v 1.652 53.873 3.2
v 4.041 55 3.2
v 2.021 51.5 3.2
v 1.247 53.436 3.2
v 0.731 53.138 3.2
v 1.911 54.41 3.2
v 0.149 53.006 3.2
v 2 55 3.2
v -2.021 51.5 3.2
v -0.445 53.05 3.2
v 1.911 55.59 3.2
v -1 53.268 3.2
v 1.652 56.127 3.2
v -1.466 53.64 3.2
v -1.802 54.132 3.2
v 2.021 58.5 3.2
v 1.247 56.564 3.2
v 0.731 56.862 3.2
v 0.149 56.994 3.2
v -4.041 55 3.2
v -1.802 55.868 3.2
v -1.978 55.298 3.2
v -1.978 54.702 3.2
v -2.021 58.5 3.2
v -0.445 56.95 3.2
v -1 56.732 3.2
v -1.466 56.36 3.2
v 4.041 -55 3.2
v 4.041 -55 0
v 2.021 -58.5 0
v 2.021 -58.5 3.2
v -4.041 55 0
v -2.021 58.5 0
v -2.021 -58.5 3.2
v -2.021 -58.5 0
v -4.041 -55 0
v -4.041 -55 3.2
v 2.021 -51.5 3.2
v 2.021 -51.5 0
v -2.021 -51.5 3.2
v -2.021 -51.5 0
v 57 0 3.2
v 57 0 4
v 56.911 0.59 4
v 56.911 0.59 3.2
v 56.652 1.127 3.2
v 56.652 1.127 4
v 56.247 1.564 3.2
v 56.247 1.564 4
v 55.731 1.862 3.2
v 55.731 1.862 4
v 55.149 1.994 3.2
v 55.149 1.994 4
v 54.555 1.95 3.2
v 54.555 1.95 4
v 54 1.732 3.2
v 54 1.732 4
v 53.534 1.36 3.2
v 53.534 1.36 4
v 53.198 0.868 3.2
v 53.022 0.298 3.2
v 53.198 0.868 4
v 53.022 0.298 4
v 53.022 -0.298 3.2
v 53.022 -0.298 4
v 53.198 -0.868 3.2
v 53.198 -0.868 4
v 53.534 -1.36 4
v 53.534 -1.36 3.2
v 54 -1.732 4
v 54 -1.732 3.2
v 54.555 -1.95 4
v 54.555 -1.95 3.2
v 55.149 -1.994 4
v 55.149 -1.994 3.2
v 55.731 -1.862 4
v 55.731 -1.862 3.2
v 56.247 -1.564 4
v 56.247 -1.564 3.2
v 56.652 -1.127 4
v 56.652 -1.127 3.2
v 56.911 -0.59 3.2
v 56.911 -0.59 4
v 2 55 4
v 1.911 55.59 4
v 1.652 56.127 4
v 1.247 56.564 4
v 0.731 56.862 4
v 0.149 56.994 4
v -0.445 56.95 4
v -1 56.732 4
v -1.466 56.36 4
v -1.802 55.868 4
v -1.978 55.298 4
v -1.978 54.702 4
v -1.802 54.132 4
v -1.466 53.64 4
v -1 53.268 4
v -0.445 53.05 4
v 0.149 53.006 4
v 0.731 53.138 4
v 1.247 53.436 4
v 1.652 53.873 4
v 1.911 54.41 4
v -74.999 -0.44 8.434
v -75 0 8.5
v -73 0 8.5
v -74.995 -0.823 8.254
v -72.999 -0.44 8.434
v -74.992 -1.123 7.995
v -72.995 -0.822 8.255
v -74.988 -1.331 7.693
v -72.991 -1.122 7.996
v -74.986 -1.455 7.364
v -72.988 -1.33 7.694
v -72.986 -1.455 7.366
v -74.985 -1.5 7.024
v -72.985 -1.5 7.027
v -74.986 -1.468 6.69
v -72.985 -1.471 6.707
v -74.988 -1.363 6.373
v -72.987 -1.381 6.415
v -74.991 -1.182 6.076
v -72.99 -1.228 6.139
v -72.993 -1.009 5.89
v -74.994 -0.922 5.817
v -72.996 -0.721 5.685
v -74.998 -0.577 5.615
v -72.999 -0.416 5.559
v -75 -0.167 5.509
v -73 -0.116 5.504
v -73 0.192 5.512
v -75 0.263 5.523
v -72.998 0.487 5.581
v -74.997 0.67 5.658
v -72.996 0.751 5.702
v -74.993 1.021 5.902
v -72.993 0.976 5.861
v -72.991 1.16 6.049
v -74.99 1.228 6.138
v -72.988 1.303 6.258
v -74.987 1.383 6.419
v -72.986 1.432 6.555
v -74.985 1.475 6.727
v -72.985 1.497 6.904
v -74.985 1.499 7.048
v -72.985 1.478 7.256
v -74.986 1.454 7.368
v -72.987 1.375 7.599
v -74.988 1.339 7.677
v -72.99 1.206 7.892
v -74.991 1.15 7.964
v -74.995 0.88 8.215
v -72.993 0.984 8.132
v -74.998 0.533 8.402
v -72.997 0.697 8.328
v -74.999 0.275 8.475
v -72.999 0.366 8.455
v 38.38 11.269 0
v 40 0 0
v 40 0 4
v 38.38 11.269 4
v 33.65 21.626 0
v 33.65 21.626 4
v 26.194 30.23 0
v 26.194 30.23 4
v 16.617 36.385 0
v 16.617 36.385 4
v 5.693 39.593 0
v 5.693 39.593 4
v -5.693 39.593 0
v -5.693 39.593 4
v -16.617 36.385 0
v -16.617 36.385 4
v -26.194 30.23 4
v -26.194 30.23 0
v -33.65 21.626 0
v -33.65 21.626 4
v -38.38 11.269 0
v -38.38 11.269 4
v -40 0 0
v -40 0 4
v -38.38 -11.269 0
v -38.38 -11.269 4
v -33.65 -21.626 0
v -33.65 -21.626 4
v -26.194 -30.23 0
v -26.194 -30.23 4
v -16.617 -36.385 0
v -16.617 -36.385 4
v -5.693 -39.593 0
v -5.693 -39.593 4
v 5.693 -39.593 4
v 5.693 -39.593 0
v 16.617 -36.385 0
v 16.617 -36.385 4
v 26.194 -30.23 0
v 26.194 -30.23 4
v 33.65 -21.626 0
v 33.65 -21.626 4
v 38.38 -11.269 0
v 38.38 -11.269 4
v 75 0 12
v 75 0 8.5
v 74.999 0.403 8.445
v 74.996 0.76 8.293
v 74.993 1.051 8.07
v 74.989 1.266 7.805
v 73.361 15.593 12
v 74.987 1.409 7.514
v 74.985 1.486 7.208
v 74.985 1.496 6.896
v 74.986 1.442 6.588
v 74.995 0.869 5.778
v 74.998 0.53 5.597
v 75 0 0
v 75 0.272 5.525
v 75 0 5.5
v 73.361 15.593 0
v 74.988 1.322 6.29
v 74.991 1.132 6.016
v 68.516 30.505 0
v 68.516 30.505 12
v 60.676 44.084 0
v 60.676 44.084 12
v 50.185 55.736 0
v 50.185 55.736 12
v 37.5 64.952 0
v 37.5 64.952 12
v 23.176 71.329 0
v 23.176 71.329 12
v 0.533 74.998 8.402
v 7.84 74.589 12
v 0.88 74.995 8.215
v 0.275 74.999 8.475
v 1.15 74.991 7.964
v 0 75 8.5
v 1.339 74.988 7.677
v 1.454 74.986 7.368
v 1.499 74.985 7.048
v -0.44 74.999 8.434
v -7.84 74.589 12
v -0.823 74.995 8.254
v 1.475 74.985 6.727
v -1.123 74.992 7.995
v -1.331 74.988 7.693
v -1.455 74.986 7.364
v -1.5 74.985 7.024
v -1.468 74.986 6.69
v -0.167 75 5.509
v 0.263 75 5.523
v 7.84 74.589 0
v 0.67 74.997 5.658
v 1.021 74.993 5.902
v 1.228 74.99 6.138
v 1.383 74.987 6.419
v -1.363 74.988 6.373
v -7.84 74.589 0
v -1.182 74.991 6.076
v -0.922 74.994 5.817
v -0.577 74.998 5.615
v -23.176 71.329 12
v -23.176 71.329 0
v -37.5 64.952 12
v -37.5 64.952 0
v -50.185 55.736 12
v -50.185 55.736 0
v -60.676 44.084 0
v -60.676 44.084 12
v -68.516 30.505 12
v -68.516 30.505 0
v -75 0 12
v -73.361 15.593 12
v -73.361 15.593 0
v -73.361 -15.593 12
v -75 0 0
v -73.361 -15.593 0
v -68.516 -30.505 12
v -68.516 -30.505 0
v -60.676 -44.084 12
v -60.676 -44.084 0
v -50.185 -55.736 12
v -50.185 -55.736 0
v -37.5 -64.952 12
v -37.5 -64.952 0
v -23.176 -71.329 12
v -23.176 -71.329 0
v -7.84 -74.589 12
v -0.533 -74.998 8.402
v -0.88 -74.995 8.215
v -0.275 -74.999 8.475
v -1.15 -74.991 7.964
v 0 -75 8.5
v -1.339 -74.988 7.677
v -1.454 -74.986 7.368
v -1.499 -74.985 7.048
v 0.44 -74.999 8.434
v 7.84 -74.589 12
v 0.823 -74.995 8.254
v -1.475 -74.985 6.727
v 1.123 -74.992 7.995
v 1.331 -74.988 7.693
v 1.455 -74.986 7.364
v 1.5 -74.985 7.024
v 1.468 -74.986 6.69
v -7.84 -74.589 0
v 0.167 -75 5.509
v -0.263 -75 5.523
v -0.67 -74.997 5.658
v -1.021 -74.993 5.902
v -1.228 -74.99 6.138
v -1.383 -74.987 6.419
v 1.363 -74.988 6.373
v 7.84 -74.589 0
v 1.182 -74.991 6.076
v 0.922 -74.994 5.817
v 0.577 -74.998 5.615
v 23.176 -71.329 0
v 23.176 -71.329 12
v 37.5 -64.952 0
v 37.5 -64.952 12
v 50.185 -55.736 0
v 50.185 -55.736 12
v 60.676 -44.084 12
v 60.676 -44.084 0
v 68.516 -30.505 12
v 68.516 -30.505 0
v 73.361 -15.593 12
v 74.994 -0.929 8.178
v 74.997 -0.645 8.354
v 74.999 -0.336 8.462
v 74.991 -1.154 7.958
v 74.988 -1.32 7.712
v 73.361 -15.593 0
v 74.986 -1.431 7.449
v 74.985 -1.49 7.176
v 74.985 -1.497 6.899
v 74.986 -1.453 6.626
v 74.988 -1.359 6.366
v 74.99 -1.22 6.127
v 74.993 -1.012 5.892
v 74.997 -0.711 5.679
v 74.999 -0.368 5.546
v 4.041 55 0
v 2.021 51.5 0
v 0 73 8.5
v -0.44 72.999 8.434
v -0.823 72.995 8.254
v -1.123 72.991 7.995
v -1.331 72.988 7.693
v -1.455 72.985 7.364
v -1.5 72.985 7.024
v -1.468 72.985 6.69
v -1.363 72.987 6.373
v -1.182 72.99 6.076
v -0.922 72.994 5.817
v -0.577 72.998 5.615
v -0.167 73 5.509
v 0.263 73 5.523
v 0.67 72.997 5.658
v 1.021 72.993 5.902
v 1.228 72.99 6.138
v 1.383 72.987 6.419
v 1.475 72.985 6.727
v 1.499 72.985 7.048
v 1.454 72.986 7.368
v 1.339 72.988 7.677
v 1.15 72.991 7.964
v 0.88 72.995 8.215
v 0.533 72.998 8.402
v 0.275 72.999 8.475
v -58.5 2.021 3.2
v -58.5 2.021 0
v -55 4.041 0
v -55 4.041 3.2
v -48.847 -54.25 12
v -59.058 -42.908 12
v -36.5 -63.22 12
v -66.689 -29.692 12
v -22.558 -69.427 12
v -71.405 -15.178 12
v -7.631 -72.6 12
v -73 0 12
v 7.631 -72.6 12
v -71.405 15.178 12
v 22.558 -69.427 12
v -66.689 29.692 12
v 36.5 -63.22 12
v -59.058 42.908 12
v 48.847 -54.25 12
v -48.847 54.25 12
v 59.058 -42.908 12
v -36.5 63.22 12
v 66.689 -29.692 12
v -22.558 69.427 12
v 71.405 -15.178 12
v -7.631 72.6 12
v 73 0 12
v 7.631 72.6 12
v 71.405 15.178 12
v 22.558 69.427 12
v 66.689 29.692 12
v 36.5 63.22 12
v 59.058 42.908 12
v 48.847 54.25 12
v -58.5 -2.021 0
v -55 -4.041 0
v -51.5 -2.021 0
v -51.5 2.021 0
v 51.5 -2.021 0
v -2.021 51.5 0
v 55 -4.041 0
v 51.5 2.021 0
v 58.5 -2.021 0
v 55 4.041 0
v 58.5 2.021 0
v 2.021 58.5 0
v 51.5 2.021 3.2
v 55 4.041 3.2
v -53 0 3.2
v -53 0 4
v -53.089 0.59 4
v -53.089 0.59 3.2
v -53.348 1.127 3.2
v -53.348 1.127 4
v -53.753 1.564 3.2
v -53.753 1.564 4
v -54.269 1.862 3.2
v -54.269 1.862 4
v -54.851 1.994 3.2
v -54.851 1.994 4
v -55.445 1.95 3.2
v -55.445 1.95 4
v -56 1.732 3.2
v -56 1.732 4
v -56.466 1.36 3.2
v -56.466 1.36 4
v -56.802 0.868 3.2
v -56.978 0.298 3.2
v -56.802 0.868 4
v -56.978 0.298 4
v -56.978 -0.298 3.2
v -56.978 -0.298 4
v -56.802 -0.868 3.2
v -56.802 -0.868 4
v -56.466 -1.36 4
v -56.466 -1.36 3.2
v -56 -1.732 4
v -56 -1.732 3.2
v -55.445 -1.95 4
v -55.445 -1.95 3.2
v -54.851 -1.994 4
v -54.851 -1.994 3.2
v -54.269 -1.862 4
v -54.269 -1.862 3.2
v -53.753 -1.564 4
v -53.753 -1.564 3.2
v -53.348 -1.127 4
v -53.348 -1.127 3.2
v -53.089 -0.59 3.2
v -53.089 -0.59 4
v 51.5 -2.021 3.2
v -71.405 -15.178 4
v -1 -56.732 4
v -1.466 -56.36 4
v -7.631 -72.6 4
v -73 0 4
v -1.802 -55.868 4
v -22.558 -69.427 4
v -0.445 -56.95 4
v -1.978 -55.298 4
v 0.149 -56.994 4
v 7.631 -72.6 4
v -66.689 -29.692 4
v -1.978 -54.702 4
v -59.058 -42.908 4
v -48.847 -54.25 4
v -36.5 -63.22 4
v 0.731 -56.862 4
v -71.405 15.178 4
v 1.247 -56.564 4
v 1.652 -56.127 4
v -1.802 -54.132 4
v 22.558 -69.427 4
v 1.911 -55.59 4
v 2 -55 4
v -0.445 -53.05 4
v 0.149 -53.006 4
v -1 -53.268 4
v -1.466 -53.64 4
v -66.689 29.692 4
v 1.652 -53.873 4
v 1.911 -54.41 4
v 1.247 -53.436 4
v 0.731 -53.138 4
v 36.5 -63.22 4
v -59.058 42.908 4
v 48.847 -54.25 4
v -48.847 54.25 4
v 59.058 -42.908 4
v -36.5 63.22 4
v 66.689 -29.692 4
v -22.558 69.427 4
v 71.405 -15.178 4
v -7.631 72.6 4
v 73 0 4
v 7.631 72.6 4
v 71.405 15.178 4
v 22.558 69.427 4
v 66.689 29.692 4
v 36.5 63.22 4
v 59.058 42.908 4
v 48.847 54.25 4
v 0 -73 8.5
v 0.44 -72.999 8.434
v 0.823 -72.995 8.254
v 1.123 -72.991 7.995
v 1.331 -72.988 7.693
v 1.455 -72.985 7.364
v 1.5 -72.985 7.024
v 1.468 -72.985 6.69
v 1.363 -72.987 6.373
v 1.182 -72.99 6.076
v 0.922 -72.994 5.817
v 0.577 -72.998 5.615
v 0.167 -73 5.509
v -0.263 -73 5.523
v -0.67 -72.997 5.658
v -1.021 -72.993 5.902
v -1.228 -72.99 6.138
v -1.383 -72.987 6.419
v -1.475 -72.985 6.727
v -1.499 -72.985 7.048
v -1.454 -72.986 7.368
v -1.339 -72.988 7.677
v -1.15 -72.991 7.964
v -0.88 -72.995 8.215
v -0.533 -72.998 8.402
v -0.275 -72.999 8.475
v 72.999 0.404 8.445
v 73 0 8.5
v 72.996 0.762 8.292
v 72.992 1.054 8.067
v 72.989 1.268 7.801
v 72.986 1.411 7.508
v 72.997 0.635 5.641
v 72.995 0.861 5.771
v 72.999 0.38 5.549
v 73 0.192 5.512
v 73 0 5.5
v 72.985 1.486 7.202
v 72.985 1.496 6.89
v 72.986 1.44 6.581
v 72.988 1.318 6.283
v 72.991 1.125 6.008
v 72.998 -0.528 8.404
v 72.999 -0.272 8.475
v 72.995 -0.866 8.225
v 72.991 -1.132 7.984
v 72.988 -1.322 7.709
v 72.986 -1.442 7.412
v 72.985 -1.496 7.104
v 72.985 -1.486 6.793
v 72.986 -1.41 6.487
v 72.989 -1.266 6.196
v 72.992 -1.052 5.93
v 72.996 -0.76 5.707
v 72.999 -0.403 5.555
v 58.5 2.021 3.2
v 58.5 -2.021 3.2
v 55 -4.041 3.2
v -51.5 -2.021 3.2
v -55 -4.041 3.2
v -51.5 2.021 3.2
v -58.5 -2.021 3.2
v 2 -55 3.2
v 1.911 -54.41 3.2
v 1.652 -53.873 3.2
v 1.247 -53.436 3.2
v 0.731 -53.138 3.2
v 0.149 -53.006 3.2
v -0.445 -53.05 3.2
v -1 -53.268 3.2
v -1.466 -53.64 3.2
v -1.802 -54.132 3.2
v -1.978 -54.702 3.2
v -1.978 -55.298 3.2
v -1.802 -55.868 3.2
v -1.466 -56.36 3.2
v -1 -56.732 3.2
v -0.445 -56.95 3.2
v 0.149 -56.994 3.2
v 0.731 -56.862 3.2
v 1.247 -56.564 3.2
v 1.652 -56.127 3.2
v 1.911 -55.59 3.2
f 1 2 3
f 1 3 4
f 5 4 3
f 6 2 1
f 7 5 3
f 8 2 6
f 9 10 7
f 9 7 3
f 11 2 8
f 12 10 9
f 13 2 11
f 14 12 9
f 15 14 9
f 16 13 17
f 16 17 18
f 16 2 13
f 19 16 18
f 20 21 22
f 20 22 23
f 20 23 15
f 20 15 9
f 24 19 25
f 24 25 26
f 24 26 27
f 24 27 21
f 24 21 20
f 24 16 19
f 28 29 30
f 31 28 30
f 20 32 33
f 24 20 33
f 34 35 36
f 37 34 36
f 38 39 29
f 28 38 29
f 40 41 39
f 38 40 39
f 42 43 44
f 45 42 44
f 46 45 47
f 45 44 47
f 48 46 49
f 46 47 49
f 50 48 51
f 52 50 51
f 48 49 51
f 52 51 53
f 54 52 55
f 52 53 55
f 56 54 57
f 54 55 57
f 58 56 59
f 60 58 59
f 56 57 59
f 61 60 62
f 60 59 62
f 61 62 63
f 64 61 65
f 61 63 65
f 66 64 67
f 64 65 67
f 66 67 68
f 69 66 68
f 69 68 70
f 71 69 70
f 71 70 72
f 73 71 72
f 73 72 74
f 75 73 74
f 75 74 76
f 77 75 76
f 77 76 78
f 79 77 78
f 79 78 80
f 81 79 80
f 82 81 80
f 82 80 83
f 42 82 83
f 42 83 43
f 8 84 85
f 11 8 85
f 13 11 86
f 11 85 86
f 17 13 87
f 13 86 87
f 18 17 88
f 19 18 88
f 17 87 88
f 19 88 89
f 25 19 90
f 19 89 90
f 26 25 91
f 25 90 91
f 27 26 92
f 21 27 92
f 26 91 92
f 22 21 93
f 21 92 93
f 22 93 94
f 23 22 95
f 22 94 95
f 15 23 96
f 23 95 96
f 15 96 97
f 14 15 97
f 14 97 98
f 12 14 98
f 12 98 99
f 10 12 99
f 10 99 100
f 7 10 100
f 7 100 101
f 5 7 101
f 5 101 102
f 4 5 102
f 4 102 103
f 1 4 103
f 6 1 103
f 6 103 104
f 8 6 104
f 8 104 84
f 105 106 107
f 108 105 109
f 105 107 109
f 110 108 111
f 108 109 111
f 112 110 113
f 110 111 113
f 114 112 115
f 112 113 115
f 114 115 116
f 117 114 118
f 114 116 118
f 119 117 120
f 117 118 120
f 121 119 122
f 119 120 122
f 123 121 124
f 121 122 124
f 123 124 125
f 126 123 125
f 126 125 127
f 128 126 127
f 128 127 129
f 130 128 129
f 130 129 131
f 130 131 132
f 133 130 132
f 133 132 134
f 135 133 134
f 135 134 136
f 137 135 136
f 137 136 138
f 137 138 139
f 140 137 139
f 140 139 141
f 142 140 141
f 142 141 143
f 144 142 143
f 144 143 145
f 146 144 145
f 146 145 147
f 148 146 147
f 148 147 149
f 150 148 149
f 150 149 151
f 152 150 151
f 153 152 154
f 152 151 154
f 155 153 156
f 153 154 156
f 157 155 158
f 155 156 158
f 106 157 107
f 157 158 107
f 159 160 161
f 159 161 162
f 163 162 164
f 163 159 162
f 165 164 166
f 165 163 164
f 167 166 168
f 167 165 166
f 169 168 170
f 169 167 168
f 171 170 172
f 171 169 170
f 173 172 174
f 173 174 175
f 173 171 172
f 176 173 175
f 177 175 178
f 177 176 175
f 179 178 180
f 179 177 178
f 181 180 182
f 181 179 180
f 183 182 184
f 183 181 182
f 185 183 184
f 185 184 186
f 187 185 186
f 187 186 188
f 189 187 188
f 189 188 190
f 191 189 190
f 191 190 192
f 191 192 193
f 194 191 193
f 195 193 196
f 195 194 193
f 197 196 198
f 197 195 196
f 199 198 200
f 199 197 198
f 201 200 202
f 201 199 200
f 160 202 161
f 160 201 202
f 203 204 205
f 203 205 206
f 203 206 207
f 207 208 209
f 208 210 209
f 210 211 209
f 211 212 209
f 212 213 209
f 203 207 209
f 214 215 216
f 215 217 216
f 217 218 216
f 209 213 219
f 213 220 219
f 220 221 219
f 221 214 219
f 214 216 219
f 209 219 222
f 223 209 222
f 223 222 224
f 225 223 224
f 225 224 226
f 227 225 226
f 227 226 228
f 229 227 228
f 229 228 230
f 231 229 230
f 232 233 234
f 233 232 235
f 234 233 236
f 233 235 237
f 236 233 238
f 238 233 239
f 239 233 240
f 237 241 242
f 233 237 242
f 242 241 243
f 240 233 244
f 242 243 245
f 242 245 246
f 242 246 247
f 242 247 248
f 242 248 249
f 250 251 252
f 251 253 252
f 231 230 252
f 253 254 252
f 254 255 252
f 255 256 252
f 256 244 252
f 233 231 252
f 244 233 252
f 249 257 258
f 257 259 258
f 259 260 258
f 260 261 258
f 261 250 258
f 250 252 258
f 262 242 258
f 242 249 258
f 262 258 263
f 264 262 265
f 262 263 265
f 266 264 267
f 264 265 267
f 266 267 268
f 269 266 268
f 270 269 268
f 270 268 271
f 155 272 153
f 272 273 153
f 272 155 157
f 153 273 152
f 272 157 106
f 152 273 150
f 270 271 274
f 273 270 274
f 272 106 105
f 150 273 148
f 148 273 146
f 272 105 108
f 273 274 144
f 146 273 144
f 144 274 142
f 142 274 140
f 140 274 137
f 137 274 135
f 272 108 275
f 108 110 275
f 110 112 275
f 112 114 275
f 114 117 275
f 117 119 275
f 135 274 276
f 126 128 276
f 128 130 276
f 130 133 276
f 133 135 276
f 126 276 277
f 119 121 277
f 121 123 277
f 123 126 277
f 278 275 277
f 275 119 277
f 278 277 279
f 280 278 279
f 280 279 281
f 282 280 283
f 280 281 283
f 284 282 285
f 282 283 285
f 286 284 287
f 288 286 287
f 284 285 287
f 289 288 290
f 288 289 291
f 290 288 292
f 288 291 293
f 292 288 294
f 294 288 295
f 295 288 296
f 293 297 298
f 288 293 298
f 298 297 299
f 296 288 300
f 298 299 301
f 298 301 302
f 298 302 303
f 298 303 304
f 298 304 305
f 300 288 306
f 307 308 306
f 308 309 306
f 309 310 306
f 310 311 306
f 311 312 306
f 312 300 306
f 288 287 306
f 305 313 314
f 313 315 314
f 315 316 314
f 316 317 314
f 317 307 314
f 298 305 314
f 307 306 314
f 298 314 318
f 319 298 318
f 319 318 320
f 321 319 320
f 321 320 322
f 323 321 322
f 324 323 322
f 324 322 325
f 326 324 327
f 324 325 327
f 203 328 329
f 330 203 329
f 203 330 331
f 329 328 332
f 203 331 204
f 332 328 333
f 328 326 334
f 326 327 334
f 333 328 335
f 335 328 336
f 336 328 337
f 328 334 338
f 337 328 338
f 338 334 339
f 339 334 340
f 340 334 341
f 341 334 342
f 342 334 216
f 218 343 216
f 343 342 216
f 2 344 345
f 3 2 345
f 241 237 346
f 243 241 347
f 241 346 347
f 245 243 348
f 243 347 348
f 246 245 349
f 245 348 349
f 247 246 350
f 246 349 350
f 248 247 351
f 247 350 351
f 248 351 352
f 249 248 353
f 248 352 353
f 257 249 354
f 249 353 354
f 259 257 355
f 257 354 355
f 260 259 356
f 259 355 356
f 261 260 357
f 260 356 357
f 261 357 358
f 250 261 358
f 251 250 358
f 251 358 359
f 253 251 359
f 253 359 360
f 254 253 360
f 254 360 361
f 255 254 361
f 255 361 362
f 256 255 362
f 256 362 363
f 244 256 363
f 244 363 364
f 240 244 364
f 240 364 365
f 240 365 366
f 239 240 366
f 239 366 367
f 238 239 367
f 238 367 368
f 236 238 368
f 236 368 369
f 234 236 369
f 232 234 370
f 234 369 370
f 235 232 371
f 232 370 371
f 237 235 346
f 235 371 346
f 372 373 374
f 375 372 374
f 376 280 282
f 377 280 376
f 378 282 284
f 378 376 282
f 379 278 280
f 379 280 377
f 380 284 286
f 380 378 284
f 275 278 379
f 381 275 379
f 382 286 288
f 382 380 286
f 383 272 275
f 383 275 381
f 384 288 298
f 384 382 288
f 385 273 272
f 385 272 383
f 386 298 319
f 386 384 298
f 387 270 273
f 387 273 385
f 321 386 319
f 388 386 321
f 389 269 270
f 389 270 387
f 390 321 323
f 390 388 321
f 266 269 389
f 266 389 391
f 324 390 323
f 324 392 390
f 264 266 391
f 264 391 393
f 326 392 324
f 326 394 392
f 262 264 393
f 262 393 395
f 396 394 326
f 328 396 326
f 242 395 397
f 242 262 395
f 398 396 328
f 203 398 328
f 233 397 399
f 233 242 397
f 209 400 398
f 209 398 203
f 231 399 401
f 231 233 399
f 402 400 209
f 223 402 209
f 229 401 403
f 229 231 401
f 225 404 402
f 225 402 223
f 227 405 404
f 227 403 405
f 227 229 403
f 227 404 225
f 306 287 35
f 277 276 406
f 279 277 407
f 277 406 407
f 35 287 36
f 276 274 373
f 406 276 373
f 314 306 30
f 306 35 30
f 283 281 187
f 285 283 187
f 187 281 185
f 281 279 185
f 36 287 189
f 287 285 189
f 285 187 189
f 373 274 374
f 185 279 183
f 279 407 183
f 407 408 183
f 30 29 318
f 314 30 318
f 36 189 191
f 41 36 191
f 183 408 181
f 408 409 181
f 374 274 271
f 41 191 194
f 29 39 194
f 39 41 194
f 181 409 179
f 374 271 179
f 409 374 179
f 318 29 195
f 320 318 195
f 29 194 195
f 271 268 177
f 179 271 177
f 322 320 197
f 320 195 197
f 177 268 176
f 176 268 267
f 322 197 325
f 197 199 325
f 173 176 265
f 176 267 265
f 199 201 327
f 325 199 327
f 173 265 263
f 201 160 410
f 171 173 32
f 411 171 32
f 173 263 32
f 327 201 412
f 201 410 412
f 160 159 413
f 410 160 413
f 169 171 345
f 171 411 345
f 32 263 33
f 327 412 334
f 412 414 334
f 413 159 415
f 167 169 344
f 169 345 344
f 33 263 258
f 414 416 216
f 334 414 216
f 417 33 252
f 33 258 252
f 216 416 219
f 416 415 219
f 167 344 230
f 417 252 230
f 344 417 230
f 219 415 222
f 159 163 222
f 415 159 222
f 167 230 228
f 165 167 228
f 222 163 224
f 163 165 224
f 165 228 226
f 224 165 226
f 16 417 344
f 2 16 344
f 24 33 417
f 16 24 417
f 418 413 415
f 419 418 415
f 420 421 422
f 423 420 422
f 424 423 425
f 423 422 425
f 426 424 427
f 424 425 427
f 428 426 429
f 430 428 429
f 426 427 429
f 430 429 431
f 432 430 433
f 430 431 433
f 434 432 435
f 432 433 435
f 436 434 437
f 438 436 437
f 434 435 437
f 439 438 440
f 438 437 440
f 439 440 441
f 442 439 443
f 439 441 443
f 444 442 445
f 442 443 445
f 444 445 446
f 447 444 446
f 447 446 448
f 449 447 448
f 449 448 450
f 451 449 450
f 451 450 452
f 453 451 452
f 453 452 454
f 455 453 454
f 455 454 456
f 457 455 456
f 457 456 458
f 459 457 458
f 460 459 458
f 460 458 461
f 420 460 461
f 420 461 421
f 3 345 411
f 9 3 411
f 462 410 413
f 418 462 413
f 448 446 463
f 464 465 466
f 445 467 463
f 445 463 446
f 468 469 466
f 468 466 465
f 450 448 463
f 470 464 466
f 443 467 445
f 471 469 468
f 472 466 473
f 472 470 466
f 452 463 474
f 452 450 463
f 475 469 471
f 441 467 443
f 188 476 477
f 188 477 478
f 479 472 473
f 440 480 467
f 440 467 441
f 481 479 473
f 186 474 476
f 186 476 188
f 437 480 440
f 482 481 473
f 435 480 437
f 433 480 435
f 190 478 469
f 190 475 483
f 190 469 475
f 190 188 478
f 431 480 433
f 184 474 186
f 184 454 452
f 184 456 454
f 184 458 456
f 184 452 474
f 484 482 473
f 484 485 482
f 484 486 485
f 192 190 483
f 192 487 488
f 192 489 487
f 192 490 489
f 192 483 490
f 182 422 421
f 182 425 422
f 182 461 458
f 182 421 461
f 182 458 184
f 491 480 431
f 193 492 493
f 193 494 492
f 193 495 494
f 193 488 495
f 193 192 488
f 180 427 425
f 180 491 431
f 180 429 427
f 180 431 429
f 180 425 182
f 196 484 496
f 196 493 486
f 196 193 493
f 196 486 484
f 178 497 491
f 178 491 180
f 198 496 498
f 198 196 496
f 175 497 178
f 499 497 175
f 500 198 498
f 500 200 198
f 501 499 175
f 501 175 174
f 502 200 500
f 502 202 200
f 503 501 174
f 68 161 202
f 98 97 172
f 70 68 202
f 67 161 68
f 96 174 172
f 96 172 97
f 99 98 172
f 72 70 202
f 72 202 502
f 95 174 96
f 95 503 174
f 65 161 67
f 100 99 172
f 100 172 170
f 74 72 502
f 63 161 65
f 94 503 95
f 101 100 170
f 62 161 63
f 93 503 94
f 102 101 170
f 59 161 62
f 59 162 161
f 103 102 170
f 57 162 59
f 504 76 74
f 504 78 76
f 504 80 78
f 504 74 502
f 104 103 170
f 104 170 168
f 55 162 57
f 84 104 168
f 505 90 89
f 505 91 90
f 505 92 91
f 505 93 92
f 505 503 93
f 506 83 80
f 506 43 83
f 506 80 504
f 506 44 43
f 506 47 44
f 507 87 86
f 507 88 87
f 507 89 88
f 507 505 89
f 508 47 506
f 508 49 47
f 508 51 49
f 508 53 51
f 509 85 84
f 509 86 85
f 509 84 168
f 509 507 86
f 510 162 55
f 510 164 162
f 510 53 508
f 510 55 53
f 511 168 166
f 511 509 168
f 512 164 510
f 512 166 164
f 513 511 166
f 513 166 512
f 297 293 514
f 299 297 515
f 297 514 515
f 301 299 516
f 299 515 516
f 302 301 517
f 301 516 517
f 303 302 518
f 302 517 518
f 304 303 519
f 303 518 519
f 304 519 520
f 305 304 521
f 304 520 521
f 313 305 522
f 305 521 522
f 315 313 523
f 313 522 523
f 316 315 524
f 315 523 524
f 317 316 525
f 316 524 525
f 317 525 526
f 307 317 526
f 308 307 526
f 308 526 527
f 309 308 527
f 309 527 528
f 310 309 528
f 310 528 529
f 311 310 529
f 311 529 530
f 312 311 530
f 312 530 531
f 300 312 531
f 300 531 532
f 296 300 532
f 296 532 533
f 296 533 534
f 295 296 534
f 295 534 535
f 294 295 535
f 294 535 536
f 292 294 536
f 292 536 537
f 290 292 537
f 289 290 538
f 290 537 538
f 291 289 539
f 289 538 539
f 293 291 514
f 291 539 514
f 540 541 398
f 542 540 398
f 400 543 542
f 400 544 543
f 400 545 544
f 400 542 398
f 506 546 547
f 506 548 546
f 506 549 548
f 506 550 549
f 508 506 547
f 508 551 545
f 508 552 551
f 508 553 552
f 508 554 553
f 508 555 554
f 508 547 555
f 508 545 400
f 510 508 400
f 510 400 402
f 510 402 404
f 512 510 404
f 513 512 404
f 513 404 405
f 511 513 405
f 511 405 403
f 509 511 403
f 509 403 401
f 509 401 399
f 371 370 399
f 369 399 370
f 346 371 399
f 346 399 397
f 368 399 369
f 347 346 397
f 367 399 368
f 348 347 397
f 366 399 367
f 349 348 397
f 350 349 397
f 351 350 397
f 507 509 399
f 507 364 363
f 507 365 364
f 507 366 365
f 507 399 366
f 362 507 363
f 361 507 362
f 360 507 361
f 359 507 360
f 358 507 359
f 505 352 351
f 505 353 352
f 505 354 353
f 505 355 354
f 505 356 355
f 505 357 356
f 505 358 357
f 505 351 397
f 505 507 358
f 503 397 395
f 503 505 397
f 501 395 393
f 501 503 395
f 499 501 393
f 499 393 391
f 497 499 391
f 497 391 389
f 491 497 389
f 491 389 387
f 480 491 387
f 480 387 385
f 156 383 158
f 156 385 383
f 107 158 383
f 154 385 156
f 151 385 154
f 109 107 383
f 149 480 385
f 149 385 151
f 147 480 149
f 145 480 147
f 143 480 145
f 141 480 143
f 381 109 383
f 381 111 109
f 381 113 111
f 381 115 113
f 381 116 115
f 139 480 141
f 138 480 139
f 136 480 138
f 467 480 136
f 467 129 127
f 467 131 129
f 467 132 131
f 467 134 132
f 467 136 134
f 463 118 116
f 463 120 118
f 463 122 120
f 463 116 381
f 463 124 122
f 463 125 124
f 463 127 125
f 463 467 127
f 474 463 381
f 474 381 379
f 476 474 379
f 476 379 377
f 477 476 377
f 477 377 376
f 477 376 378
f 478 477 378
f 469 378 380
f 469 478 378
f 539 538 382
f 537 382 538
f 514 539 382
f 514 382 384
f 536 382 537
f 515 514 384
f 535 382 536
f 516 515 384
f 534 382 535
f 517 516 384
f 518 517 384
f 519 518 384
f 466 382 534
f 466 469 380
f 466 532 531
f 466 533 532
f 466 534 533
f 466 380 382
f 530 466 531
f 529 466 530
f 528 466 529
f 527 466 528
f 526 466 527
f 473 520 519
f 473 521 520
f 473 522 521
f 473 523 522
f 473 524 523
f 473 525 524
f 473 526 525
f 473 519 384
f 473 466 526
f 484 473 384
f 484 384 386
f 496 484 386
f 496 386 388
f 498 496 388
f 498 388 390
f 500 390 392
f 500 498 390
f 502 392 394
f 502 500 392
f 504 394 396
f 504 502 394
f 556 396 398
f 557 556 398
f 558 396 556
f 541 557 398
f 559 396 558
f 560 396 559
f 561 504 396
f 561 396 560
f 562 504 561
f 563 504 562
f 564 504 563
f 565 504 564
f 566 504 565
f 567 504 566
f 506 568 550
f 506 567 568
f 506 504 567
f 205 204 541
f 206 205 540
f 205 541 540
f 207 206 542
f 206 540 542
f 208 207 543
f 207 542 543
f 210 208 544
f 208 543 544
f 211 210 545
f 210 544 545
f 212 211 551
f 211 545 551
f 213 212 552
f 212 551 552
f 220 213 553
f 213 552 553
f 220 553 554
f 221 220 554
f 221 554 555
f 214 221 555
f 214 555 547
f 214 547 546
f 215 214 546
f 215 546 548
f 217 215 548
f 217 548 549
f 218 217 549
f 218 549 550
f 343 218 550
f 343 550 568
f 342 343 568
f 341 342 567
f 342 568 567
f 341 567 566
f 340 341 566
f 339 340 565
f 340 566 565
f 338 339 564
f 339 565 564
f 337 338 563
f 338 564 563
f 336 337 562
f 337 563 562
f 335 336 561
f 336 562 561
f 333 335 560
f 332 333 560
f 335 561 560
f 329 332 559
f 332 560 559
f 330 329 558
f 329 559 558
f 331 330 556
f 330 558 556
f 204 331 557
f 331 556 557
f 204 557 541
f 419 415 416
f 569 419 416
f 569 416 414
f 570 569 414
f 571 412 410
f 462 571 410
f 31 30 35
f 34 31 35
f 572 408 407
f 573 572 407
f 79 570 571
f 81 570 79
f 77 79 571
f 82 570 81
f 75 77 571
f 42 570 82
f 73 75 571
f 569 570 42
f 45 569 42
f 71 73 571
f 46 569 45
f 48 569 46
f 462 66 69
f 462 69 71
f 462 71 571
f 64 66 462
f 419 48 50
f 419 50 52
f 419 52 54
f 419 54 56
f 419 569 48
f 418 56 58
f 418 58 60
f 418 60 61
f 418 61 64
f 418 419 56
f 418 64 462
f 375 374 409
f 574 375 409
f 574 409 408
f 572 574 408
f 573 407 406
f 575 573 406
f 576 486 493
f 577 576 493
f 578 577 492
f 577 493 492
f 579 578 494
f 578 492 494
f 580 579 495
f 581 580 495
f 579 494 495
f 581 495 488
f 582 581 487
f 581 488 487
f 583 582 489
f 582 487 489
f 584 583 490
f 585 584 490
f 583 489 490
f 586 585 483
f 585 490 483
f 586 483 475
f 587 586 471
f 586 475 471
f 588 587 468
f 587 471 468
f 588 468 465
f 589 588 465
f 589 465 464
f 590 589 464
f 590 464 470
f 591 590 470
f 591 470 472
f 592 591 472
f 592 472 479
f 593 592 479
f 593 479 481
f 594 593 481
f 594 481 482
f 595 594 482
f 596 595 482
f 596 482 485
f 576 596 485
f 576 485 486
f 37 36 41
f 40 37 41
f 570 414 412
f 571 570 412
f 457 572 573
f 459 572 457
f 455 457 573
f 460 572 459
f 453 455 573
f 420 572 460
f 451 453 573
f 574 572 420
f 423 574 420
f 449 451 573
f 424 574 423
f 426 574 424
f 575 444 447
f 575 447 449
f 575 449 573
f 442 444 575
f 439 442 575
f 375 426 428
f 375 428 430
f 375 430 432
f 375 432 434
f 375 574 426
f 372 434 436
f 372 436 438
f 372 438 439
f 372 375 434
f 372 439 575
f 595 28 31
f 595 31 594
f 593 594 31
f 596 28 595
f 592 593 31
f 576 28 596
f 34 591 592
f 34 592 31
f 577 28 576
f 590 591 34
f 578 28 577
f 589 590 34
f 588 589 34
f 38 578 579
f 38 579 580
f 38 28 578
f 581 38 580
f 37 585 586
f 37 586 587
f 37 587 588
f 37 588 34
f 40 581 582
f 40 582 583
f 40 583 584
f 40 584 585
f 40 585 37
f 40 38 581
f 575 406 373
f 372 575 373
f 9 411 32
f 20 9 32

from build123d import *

# Parameters (mm, degrees)
SKETCH1_R               = 75
SKETCH1_R_2             = 40
BOSS_EXTRUDE1_DEPTH     = 4
SKETCH2_R               = 75
SKETCH2_R_2             = 73
BOSS_EXTRUDE2_DEPTH     = 8
CUT_EXTRUDE1_REACH      = 108.743
CUT_EXTRUDE1_END_RADIUS = 75
SKETCH3_R               = 1.5
CIRPATTERN1_COUNT       = 4
F_4_0MM_DOWEL_HOLE1_D   = 4
CUT_EXTRUDE2_DEPTH      = 3.2


with BuildPart() as part:
    # Sketch1 → Boss-Extrude1 (new body)
    with BuildSketch(Plane.XY):
        Circle(SKETCH1_R)
        Circle(SKETCH1_R_2, mode=Mode.SUBTRACT)
    extrude(amount=BOSS_EXTRUDE1_DEPTH)

    # Sketch2 → Boss-Extrude2 (add)
    with BuildSketch(Plane.XY.offset(4)):
        Circle(SKETCH2_R)
        Circle(SKETCH2_R_2, mode=Mode.SUBTRACT)
    extrude(amount=BOSS_EXTRUDE2_DEPTH)

    # Cut-Extrude1: up to this cylinder (the profile starts inside it)
    cut_extrude1_end = Plane(origin=(0, 0, 7), z_dir=(0, 0, -1)) * Cylinder(CUT_EXTRUDE1_END_RADIUS, 368.486, mode=Mode.PRIVATE)
    # Sketch3 → Cut-Extrude1 (cut, up to the surface)
    with BuildSketch(Plane(origin=(0, 0, 0), x_dir=(1, 0, 0), z_dir=(0, 1, 0)), mode=Mode.PRIVATE) as cut_extrude1_sk1:
        with Locations(Location((0, -7, 0), (0, 0, 270))):
            Circle(SKETCH3_R)
    cut_extrude1_tool1 = extrude(cut_extrude1_sk1.sketch, amount=-CUT_EXTRUDE1_REACH, mode=Mode.PRIVATE) & cut_extrude1_end
    cut_extrude1 = cut_extrude1_tool1.solids().sort_by_distance((0, 0, 7))[0]
    add(cut_extrude1, mode=Mode.SUBTRACT)

    # CirPattern1: Cut-Extrude1 ×4 about axis
    cirpattern1_axis = Axis((0, 0, 4), (0, 0, -1))
    for i in range(1, CIRPATTERN1_COUNT):
        add(cut_extrude1.rotate(cirpattern1_axis, i * 360 / CIRPATTERN1_COUNT), mode=Mode.SUBTRACT)

    # Ø4.0mm Dowel Hole1 (through all)
    with Locations(Plane(origin=(0, 0, 0), x_dir=(-1, 0, 0), z_dir=(0, 0, -1))):
        with Locations((0, 55), (55, 0), (0, -55), (-55, 0)):
            Hole(F_4_0MM_DOWEL_HOLE1_D / 2)

    # Sketch13 → Cut-Extrude2 (cut)
    with BuildSketch(Plane(origin=(0, 0, 0), x_dir=(-1, 0, 0), z_dir=(0, 0, -1))):
        Polygon((4.041451884, 55), (2.020725942, 58.5), (-2.020725942, 58.5), (-4.041451884, 55), (-2.020725942, 51.5), (2.020725942, 51.5), align=None)
        Polygon((55, -4.041451884), (58.5, -2.020725942), (58.5, 2.020725942), (55, 4.041451884), (51.5, 2.020725942), (51.5, -2.020725942), align=None)
        Polygon((-4.041451884, -55), (-2.020725942, -58.5), (2.020725942, -58.5), (4.041451884, -55), (2.020725942, -51.5), (-2.020725942, -51.5), align=None)
        Polygon((-55, 4.041451884), (-58.5, 2.020725942), (-58.5, -2.020725942), (-55, -4.041451884), (-51.5, -2.020725942), (-51.5, 2.020725942), align=None)
    extrude(amount=-CUT_EXTRUDE2_DEPTH, mode=Mode.SUBTRACT)


solid = part.part
